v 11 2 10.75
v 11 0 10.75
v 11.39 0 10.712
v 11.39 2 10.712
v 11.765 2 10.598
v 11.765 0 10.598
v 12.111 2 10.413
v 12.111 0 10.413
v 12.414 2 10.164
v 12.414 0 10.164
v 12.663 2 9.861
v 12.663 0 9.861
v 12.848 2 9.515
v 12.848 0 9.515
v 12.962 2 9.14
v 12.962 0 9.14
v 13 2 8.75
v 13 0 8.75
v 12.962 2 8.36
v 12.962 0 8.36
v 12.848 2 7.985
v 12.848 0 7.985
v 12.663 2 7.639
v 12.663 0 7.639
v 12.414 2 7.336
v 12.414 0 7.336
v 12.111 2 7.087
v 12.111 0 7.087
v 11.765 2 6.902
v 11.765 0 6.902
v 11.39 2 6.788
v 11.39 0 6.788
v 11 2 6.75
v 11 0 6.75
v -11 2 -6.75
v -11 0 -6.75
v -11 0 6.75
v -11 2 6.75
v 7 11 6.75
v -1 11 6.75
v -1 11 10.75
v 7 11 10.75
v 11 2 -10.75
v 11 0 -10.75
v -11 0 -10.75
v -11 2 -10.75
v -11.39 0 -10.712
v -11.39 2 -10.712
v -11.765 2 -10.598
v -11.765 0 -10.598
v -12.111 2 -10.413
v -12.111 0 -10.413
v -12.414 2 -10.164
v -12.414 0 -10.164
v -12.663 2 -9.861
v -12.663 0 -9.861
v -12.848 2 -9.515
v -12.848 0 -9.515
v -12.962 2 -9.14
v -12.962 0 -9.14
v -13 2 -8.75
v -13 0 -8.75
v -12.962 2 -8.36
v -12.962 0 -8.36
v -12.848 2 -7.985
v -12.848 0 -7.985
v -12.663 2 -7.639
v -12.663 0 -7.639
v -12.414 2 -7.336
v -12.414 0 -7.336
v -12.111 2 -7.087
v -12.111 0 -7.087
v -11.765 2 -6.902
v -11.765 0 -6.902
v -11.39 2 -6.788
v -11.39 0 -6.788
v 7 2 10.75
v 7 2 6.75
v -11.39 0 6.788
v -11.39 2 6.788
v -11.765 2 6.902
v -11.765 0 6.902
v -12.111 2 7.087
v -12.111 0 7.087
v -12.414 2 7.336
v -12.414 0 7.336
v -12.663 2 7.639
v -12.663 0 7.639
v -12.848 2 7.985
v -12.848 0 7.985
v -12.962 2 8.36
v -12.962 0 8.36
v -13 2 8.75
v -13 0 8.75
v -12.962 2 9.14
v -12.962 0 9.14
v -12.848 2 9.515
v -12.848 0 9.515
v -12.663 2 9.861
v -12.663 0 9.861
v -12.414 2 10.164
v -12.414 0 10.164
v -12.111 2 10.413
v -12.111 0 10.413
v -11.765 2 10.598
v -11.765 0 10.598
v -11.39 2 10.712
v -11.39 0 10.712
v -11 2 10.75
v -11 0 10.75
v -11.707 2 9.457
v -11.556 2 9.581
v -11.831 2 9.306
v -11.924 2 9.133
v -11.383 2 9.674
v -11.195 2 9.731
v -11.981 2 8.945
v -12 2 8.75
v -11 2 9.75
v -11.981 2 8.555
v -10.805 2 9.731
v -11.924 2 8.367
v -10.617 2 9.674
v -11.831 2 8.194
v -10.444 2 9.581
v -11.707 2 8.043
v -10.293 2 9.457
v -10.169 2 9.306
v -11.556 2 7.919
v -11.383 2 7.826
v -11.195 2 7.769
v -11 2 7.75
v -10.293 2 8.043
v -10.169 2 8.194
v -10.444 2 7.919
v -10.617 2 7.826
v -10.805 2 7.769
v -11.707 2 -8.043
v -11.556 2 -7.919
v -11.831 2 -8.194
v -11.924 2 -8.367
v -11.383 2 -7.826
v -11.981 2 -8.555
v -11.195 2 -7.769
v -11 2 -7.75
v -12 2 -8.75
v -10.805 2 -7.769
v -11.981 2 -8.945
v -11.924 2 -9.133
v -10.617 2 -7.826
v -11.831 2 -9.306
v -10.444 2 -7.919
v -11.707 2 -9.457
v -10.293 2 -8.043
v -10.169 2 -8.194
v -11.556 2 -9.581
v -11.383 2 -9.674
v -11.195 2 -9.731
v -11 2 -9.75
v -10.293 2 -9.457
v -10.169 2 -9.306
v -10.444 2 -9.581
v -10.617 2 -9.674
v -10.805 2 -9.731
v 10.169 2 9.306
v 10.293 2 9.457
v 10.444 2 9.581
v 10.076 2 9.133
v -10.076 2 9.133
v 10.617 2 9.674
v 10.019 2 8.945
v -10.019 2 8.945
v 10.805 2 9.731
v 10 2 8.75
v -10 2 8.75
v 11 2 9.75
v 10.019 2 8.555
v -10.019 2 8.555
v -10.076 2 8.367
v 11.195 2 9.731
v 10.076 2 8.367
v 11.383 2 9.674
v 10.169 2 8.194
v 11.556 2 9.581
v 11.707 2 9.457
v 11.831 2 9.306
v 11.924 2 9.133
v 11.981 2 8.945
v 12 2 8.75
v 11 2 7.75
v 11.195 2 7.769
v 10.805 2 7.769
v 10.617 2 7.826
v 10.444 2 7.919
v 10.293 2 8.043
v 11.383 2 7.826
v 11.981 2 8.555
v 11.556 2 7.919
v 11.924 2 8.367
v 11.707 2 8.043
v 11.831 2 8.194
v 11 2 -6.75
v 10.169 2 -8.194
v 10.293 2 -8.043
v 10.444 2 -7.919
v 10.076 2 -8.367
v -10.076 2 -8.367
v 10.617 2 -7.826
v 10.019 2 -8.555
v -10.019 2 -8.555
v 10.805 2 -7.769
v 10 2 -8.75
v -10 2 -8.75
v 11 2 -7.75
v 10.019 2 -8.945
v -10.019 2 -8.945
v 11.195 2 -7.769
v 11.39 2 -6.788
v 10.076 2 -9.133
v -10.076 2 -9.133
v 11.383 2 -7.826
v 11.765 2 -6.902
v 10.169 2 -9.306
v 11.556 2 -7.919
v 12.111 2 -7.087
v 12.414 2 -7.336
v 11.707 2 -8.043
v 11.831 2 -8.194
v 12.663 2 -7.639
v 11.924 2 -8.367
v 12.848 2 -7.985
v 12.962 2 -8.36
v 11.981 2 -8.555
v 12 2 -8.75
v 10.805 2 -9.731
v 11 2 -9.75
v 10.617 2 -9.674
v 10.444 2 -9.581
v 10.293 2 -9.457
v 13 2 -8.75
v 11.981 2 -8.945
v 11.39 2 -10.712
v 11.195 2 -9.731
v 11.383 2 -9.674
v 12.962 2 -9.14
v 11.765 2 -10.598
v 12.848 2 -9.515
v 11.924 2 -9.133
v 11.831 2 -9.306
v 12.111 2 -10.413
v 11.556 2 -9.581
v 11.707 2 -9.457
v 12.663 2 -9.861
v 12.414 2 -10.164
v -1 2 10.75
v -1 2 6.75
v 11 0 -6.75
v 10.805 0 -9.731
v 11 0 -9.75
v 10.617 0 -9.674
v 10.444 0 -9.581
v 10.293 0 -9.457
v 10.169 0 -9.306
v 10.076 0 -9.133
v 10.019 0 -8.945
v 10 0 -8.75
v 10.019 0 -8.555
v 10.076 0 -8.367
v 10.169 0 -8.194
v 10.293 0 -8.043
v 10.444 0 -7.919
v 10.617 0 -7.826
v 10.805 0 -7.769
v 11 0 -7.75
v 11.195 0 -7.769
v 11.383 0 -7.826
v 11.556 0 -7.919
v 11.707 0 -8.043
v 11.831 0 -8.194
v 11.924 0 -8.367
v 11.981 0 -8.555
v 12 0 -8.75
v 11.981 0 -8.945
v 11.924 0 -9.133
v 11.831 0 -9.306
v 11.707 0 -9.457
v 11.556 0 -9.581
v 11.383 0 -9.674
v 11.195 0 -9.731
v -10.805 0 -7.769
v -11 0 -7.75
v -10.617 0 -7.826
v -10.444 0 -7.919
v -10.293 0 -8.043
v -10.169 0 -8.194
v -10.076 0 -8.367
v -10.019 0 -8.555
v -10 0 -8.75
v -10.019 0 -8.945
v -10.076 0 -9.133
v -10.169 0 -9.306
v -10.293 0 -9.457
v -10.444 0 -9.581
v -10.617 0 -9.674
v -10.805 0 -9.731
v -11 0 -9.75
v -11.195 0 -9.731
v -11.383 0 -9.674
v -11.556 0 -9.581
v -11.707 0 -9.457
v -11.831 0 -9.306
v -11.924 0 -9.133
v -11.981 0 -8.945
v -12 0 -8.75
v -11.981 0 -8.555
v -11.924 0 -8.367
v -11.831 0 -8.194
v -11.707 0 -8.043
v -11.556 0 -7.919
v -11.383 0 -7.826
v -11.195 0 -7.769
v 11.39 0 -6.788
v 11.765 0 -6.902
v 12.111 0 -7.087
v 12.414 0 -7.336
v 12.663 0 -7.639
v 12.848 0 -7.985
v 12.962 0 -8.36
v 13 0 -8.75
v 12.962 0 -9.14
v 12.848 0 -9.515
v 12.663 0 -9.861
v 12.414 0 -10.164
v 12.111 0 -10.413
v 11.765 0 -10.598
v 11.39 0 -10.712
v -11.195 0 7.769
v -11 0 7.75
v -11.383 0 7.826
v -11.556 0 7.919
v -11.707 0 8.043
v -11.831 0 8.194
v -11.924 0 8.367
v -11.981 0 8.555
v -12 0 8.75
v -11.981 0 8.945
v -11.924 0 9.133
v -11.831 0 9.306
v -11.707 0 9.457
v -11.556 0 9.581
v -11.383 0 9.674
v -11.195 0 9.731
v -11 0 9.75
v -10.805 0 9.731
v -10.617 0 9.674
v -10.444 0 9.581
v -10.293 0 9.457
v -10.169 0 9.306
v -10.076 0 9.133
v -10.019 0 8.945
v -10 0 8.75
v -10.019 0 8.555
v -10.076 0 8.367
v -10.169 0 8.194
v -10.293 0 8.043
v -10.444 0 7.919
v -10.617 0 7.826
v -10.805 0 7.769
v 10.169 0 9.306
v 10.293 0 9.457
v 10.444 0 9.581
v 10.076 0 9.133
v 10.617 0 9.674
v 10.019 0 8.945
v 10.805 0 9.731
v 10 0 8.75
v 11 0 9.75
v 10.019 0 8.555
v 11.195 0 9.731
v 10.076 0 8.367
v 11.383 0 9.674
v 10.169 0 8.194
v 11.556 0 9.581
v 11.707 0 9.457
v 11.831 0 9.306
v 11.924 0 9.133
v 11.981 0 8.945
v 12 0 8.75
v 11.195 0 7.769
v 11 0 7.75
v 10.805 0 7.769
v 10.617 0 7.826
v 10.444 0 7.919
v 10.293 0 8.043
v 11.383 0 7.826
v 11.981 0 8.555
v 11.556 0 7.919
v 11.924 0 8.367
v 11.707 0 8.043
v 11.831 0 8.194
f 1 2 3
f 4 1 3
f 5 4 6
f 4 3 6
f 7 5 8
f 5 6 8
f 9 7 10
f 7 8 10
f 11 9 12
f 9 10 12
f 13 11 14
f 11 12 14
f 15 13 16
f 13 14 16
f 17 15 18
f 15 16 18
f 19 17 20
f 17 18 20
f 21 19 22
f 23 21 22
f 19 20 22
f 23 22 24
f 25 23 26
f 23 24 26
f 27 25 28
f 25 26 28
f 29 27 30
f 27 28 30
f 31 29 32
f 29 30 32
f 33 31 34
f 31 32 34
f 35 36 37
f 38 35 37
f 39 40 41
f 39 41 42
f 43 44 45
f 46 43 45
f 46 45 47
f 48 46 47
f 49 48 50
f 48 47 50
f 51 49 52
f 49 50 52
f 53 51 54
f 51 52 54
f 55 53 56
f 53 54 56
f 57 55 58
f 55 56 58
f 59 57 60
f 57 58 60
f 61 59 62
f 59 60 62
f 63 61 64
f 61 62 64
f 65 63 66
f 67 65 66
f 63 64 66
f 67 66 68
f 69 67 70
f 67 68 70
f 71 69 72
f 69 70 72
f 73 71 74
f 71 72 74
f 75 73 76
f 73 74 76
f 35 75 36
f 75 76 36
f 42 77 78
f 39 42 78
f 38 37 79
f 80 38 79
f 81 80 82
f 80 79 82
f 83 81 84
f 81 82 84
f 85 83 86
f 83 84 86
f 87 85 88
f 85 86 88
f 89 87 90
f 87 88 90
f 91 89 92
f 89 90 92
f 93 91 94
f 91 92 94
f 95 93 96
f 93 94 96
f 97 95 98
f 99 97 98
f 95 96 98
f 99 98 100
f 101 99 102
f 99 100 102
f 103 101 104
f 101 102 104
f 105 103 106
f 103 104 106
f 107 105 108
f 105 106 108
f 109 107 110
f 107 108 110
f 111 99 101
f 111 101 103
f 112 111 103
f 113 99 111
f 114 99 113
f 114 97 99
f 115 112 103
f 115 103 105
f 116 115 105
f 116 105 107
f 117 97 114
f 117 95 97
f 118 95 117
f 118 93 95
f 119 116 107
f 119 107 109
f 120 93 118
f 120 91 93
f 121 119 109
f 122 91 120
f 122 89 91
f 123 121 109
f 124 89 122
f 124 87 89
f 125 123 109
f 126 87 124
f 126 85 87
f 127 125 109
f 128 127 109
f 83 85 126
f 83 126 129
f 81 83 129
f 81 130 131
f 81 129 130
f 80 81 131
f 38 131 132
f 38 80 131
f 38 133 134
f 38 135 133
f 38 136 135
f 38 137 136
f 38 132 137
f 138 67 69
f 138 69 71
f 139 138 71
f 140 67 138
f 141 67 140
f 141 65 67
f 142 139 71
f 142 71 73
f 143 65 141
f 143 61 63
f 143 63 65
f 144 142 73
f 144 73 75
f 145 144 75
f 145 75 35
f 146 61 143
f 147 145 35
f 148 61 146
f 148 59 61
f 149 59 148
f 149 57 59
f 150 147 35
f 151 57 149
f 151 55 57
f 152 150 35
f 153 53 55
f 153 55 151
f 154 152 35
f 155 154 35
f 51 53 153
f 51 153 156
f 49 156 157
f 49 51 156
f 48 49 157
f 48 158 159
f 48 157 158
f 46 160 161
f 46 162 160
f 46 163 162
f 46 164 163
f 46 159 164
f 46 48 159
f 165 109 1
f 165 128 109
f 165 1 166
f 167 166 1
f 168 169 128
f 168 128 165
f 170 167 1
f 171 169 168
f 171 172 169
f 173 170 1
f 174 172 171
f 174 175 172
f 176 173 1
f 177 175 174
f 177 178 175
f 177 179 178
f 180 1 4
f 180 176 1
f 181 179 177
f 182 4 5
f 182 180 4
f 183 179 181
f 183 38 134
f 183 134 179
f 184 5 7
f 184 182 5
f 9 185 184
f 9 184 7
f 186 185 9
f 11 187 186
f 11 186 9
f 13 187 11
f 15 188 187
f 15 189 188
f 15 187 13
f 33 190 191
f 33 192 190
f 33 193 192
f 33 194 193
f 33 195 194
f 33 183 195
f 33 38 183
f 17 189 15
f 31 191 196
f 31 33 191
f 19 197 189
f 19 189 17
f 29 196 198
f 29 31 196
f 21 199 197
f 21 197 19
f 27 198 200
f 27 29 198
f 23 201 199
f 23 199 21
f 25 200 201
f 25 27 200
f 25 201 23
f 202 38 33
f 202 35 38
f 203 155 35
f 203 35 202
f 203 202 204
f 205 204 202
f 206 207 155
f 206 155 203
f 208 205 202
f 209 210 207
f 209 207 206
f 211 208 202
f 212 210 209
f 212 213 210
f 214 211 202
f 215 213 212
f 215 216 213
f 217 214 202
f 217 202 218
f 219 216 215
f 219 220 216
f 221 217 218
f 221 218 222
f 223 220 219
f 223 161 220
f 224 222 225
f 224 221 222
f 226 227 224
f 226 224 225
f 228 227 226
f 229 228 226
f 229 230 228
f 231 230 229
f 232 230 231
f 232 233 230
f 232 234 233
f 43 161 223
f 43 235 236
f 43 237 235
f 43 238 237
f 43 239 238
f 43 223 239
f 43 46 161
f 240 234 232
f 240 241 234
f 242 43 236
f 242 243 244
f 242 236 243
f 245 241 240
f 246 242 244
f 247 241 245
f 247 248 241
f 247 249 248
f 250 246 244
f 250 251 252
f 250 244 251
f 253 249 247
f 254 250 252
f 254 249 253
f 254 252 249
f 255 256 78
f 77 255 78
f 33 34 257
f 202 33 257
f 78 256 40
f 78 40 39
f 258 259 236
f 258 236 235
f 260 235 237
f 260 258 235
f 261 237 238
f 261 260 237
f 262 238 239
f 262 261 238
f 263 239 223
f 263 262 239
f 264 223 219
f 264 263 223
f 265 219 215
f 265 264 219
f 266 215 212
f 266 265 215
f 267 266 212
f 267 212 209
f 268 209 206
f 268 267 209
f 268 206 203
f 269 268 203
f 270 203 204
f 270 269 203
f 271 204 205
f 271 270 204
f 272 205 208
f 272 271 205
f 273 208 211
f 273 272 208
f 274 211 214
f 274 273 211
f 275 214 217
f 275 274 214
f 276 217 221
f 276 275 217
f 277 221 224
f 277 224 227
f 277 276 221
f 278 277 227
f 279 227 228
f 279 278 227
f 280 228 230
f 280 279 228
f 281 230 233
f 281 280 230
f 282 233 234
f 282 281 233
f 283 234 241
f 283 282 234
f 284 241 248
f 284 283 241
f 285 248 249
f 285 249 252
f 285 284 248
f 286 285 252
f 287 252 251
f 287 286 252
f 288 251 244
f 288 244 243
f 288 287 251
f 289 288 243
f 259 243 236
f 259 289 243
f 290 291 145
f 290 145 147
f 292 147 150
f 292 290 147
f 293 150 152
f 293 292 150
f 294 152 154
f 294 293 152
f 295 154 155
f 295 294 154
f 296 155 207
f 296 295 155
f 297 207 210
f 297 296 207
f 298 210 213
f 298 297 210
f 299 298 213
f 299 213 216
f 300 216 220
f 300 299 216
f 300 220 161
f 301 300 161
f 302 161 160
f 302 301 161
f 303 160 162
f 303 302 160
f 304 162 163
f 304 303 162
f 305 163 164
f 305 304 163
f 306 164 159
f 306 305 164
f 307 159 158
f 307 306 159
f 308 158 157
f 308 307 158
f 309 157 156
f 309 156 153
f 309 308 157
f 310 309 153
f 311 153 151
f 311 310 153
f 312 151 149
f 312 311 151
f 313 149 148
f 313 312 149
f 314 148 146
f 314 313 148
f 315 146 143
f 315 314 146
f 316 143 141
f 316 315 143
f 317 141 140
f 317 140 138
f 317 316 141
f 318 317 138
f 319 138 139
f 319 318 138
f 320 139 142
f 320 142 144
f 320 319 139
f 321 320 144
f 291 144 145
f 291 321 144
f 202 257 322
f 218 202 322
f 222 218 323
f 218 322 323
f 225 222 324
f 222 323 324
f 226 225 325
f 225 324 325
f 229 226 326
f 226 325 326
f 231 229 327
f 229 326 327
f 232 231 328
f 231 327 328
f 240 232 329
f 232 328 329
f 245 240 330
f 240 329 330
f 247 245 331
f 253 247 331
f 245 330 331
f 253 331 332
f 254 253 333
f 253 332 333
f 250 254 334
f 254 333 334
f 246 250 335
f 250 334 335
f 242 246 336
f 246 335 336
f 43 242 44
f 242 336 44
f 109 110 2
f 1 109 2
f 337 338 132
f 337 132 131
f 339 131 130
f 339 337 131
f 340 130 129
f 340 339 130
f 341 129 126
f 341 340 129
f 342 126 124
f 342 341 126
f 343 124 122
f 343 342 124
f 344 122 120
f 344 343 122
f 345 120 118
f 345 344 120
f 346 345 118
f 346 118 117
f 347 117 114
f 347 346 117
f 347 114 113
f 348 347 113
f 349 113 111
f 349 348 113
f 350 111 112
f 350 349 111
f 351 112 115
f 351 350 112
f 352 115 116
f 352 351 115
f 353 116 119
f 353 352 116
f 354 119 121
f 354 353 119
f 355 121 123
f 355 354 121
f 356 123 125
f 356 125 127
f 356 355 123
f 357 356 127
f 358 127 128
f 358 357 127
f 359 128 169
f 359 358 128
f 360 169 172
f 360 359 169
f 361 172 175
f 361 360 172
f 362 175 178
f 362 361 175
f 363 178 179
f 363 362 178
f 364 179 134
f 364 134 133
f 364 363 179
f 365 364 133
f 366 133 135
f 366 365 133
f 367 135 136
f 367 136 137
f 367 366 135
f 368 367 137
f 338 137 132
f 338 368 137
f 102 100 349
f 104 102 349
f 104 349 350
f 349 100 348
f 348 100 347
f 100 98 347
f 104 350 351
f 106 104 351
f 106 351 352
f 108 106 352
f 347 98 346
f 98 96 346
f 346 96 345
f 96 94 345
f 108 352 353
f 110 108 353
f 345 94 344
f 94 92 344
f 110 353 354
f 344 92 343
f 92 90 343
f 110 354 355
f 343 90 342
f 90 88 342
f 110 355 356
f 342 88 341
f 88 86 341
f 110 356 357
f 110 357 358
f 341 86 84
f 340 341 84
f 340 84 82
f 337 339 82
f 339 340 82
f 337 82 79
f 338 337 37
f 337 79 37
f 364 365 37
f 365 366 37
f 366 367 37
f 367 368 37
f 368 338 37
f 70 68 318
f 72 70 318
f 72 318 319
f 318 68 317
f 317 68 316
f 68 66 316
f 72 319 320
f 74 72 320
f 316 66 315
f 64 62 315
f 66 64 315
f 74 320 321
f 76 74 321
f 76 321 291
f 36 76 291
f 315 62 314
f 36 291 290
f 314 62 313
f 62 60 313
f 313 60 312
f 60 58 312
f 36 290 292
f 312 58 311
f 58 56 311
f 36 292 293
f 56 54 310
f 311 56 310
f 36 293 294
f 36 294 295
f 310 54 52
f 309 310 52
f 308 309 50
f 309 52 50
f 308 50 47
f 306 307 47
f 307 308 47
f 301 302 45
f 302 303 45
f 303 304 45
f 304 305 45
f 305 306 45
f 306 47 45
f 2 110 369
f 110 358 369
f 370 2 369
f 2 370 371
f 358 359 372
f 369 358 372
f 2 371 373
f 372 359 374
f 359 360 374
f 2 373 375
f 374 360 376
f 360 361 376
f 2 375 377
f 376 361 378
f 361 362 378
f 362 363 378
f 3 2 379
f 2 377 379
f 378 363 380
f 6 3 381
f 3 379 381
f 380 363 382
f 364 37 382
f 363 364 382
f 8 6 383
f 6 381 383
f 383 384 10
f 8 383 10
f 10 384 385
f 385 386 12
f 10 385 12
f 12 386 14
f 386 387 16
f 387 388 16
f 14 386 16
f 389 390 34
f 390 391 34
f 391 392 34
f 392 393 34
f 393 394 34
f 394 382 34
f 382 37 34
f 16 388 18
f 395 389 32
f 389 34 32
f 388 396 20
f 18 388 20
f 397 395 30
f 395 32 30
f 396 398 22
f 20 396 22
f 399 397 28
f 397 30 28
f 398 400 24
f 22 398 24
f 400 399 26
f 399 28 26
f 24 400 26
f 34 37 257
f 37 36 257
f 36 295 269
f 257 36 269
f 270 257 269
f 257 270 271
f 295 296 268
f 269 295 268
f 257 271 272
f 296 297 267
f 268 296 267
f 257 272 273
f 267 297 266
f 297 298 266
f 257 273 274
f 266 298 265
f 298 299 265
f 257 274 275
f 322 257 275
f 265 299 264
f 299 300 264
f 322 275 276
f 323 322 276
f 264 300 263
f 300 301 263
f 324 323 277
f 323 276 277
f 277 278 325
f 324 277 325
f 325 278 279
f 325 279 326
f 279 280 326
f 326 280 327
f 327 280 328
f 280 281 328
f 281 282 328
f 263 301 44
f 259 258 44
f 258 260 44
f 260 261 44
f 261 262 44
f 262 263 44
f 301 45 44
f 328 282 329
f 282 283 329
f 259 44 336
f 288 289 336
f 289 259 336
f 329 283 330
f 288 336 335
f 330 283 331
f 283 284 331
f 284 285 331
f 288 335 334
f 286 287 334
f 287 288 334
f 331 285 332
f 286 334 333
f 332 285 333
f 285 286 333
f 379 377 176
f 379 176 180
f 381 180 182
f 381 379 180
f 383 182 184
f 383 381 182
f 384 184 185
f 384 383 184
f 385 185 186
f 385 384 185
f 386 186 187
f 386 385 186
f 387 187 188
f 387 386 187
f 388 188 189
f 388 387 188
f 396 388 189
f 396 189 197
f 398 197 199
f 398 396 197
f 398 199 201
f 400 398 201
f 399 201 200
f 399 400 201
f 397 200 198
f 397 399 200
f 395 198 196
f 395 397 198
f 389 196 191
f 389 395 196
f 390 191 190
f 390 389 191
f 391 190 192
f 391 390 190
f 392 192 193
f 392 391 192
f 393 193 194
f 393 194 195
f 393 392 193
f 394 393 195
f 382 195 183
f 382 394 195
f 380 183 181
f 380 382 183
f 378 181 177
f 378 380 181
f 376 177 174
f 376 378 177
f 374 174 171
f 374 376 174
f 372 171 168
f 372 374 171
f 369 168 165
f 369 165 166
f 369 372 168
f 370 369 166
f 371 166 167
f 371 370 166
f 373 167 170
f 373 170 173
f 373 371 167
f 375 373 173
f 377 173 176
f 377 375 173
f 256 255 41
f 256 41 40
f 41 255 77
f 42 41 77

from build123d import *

# Parameters (mm, degrees)
SKETCH_1_R      = 1
EXTRUDE_1_DEPTH = 2
SKETCH_2_W      = 8
SKETCH_2_H      = 4
EXTRUDE_2_DEPTH = 9


with BuildPart() as part:
    # 草图1 → 凸台-拉伸1 (new body)
    with BuildSketch(Plane(origin=(0, 0, 0), x_dir=(1, 0, 0), z_dir=(0, 1, 0))):
        with BuildLine():
            Line((-11, -10.75), (11, -10.75))
            ThreePointArc((11, -10.75), (13, -8.75), (11, -6.75))
            Line((11, -6.75), (11, 6.75))
            ThreePointArc((11, 6.75), (13, 8.75), (11, 10.75))
            Line((11, 10.75), (-11, 10.75))
            ThreePointArc((-11, 10.75), (-13, 8.75), (-11, 6.75))
            Line((-11, 6.75), (-11, -6.75))
            ThreePointArc((-11, -6.75), (-13, -8.75), (-11, -10.75))
        make_face()
        with Locations(Location((-11, 8.75, 0), (0, 0, 270))):
            Circle(SKETCH_1_R, mode=Mode.SUBTRACT)
        with Locations(Location((11, 8.75, 0), (0, 0, 90))):
            Circle(SKETCH_1_R, mode=Mode.SUBTRACT)
        with Locations(Location((11, -8.75, 0), (0, 0, 270))):
            Circle(SKETCH_1_R, mode=Mode.SUBTRACT)
        with Locations(Location((-11, -8.75, 0), (0, 0, 90))):
            Circle(SKETCH_1_R, mode=Mode.SUBTRACT)
    extrude(amount=EXTRUDE_1_DEPTH)


with BuildPart() as body_2:
    # 草图2 → 凸台-拉伸2 (new body)
    with BuildSketch(Plane(origin=(0, 2, 0), x_dir=(1, 0, 0), z_dir=(0, 1, 0))):
        with Locations((3, -8.75)):
            Rectangle(SKETCH_2_W, SKETCH_2_H)
    extrude(amount=EXTRUDE_2_DEPTH)


solid = Compound([part.part, body_2.part])
